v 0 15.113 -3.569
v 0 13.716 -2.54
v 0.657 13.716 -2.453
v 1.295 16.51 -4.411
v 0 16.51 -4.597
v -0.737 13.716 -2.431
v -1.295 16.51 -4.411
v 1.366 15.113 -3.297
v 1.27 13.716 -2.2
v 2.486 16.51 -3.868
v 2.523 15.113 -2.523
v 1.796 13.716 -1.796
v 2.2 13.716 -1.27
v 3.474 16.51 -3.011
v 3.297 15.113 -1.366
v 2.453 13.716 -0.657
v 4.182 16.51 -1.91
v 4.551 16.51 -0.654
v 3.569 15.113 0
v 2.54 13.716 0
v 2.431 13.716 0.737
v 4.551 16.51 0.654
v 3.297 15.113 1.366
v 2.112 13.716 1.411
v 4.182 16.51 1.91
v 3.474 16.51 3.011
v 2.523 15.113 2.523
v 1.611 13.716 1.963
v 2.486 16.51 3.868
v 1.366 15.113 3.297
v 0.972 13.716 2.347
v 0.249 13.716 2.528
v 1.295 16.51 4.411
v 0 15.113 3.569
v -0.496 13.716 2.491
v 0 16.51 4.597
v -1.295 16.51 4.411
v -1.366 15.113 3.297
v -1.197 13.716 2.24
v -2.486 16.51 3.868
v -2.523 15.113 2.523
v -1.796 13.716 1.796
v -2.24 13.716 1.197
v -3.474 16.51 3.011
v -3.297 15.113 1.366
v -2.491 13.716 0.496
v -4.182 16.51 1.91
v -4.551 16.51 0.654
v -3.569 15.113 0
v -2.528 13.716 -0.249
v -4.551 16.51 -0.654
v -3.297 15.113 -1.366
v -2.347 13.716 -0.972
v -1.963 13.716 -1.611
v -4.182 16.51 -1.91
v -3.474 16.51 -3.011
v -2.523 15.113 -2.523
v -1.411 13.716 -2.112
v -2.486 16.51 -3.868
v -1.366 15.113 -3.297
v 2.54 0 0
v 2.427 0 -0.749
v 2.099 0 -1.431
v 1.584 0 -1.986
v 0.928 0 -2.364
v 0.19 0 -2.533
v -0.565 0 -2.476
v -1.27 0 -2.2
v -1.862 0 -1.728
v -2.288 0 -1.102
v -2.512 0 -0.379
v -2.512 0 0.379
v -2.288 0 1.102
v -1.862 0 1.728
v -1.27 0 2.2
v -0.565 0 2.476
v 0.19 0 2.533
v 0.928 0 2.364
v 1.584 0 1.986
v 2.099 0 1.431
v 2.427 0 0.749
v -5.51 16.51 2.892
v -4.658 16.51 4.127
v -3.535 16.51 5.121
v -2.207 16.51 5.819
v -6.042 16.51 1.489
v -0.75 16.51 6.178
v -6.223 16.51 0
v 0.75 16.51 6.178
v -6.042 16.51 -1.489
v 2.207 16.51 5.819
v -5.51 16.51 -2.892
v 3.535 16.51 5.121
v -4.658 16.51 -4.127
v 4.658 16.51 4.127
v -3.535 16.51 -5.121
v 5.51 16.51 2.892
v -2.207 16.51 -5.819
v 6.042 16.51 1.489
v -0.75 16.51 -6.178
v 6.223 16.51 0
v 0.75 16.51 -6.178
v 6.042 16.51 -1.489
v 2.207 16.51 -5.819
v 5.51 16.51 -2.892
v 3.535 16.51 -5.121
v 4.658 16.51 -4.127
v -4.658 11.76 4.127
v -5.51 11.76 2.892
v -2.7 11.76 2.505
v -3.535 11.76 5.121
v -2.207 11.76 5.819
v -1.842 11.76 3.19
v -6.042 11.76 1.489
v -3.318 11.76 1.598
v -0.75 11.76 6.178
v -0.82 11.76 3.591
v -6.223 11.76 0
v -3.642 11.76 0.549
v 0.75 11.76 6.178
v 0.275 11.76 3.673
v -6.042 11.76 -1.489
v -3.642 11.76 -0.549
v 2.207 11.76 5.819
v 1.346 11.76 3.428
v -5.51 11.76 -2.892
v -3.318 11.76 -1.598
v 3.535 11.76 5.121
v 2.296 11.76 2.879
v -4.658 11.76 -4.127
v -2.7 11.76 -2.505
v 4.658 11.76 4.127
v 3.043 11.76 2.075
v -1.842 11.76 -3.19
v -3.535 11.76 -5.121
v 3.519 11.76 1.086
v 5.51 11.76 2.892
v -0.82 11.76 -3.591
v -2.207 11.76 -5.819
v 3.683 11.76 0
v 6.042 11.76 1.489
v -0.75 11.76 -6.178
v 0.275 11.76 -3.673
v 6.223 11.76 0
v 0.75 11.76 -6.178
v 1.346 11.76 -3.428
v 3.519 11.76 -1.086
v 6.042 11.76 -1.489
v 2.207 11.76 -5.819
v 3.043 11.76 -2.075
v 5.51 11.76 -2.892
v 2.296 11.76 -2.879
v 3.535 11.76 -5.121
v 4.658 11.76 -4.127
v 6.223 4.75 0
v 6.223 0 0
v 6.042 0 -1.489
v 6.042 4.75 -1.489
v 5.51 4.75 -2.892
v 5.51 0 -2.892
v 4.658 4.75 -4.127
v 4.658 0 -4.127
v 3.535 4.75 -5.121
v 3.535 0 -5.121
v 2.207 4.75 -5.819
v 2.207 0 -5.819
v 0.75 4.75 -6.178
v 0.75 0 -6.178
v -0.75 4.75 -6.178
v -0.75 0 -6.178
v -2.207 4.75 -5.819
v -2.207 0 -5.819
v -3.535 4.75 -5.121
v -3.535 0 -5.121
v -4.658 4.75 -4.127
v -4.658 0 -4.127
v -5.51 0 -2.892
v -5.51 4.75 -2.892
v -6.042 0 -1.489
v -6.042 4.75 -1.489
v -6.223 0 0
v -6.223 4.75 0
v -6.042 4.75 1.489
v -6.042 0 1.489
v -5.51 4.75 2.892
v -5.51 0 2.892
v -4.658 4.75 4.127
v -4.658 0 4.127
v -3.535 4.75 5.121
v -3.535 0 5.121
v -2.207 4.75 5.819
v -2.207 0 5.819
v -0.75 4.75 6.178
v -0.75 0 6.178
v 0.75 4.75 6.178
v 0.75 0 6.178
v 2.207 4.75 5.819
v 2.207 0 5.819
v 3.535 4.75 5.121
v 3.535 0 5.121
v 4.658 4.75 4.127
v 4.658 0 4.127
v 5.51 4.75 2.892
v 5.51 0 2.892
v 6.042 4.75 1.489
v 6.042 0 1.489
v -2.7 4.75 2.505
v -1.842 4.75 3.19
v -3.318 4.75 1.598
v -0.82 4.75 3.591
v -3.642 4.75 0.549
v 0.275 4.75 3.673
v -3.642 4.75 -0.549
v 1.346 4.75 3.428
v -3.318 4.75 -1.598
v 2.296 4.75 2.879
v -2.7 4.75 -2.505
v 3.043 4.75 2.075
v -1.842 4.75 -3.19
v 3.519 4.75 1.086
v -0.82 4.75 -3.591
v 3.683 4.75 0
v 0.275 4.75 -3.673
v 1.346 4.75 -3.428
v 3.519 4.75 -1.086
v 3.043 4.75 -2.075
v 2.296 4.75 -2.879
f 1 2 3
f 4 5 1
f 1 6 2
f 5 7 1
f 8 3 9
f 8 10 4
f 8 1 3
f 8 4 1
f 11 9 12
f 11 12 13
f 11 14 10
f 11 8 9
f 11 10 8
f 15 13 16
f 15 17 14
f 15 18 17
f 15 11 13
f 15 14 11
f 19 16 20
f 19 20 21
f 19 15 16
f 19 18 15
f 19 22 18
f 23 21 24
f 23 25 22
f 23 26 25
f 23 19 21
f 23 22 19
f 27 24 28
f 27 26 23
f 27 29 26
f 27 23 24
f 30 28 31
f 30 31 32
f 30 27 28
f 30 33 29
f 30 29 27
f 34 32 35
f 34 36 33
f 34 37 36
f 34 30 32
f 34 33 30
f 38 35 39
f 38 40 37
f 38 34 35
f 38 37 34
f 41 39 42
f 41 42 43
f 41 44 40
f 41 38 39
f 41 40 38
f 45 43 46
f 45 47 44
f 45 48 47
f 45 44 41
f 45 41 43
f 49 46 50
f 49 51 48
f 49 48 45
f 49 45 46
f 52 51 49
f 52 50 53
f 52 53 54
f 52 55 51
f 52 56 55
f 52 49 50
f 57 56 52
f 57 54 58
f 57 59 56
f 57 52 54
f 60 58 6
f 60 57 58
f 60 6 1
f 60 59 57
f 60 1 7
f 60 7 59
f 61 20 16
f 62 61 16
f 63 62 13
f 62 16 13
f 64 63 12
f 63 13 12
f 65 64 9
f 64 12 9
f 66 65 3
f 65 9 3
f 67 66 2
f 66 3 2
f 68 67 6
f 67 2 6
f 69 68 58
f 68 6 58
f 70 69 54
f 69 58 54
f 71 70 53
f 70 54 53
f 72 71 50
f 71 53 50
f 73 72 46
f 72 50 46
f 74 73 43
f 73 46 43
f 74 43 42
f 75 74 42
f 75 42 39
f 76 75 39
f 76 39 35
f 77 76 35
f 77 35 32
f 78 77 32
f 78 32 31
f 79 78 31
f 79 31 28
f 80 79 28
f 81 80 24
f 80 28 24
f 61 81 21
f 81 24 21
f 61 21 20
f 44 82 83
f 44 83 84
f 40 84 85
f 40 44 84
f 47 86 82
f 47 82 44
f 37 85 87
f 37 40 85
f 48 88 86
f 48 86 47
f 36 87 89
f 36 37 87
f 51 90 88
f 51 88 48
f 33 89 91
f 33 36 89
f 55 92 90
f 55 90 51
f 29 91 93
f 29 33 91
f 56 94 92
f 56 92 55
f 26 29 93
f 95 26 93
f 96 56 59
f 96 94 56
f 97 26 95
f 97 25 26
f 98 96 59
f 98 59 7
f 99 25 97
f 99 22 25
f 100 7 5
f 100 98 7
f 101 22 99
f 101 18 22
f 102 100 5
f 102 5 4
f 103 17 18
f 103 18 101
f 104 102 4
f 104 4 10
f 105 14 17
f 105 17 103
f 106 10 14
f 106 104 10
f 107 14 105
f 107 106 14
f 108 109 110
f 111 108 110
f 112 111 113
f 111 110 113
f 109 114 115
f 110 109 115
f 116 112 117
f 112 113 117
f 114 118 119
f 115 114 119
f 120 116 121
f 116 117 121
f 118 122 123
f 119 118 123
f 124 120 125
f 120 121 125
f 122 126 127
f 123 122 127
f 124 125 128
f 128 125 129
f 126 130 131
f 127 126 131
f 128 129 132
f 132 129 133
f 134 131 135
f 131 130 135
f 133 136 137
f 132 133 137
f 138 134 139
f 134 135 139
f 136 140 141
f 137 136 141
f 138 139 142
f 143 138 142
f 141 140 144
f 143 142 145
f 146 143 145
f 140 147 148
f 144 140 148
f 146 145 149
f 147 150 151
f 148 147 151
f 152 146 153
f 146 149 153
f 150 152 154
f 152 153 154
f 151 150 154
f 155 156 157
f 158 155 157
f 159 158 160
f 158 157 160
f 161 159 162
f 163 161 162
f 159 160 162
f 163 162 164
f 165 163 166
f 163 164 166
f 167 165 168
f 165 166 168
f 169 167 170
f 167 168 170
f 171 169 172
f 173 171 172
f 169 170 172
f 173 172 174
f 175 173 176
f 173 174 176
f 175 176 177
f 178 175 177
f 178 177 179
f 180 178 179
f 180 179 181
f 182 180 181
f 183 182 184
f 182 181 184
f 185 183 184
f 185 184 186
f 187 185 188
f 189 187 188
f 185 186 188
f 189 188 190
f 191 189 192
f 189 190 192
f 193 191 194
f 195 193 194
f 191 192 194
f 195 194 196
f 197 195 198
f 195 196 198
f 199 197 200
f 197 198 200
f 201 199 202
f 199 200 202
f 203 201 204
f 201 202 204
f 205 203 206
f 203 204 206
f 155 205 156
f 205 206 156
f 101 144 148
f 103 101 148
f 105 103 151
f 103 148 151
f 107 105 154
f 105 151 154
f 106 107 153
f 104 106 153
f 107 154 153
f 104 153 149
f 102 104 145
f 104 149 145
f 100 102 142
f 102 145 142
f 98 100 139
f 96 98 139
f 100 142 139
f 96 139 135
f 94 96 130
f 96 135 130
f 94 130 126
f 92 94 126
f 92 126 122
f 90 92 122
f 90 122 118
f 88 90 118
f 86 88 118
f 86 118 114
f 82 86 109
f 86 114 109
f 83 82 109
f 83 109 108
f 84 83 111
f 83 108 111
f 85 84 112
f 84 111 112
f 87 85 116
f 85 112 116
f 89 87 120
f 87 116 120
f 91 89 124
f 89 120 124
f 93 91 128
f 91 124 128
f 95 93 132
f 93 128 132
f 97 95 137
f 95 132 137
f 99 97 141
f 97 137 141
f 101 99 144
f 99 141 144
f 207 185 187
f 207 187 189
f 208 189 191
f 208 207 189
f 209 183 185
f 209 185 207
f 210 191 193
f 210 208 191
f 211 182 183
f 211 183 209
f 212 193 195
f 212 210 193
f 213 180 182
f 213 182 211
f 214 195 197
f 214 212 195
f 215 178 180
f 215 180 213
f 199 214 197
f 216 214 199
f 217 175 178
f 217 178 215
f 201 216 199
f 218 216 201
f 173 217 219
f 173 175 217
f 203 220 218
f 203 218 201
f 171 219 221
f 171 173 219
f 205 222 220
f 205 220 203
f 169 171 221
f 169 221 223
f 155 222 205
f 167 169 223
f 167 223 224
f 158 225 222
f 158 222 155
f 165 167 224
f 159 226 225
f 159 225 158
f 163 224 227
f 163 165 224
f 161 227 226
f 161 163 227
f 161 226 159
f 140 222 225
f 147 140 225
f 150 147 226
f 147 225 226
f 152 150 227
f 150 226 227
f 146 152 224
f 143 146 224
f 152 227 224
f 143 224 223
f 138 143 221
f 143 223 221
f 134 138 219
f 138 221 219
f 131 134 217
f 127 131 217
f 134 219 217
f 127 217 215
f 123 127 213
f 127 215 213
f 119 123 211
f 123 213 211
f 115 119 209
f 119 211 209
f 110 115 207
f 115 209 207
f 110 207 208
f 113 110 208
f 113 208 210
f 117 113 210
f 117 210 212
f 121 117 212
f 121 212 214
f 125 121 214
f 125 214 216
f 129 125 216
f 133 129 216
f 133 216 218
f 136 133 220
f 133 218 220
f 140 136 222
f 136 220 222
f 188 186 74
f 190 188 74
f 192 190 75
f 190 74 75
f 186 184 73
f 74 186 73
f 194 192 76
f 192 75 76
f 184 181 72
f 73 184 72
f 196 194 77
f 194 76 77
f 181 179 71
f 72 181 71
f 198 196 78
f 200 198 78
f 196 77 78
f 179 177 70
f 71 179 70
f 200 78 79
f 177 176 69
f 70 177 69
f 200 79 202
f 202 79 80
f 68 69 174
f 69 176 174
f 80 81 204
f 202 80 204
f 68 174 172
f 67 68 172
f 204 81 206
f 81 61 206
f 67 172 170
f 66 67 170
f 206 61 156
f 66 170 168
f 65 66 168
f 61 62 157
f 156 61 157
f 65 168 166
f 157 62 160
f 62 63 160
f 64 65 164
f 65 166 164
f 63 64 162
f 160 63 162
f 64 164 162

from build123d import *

# Parameters (mm, degrees)
SKETCH1_R           = 6.223
BOSS_EXTRUDE1_DEPTH = 4.7498
SKETCH2_R           = 3.683
BOSS_EXTRUDE2_DEPTH = 7.0104
SKETCH3_R           = 6.223
BOSS_EXTRUDE3_DEPTH = 4.7498
SKETCH4_R           = 2.54
CUT_EXTRUDE1_DEPTH  = 16.51


with BuildPart() as part:
    # Sketch1 → Boss-Extrude1 (new body)
    with BuildSketch(Plane(origin=(0, 0, 0), x_dir=(1, 0, 0), z_dir=(0, 1, 0))):
        Circle(SKETCH1_R)
    extrude(amount=BOSS_EXTRUDE1_DEPTH)

    # Sketch2 → Boss-Extrude2 (add)
    with BuildSketch(Plane(origin=(0, 4.7498, 0), x_dir=(1, 0, 0), z_dir=(0, 1, 0))):
        Circle(SKETCH2_R)
    extrude(amount=BOSS_EXTRUDE2_DEPTH)

    # Sketch3 → Boss-Extrude3 (add)
    with BuildSketch(Plane(origin=(0, 11.7602, 0), x_dir=(1, 0, 0), z_dir=(0, 1, 0))):
        Circle(SKETCH3_R)
    extrude(amount=BOSS_EXTRUDE3_DEPTH)

    # Sketch4 → Cut-Extrude1 (cut)
    with BuildSketch(Plane(origin=(0, 16.51, 0), x_dir=(1, 0, 0), z_dir=(0, 1, 0))):
        Circle(SKETCH4_R)
    extrude(amount=-CUT_EXTRUDE1_DEPTH, mode=Mode.SUBTRACT)

    # Sketch5 → Cut-Revolve1 (revolve, cut)
    with BuildSketch(Plane(origin=(0, 0, 0), x_dir=(0, 0, -1), z_dir=(1, 0, 0))):
        Polygon((0, 16.51), (0, 13.716), (2.54, 13.716), (4.5974, 16.51), align=None)
    revolve(axis=Axis((0, 16.51, 0), (0, -1, 0)), mode=Mode.SUBTRACT)


solid = part.part
